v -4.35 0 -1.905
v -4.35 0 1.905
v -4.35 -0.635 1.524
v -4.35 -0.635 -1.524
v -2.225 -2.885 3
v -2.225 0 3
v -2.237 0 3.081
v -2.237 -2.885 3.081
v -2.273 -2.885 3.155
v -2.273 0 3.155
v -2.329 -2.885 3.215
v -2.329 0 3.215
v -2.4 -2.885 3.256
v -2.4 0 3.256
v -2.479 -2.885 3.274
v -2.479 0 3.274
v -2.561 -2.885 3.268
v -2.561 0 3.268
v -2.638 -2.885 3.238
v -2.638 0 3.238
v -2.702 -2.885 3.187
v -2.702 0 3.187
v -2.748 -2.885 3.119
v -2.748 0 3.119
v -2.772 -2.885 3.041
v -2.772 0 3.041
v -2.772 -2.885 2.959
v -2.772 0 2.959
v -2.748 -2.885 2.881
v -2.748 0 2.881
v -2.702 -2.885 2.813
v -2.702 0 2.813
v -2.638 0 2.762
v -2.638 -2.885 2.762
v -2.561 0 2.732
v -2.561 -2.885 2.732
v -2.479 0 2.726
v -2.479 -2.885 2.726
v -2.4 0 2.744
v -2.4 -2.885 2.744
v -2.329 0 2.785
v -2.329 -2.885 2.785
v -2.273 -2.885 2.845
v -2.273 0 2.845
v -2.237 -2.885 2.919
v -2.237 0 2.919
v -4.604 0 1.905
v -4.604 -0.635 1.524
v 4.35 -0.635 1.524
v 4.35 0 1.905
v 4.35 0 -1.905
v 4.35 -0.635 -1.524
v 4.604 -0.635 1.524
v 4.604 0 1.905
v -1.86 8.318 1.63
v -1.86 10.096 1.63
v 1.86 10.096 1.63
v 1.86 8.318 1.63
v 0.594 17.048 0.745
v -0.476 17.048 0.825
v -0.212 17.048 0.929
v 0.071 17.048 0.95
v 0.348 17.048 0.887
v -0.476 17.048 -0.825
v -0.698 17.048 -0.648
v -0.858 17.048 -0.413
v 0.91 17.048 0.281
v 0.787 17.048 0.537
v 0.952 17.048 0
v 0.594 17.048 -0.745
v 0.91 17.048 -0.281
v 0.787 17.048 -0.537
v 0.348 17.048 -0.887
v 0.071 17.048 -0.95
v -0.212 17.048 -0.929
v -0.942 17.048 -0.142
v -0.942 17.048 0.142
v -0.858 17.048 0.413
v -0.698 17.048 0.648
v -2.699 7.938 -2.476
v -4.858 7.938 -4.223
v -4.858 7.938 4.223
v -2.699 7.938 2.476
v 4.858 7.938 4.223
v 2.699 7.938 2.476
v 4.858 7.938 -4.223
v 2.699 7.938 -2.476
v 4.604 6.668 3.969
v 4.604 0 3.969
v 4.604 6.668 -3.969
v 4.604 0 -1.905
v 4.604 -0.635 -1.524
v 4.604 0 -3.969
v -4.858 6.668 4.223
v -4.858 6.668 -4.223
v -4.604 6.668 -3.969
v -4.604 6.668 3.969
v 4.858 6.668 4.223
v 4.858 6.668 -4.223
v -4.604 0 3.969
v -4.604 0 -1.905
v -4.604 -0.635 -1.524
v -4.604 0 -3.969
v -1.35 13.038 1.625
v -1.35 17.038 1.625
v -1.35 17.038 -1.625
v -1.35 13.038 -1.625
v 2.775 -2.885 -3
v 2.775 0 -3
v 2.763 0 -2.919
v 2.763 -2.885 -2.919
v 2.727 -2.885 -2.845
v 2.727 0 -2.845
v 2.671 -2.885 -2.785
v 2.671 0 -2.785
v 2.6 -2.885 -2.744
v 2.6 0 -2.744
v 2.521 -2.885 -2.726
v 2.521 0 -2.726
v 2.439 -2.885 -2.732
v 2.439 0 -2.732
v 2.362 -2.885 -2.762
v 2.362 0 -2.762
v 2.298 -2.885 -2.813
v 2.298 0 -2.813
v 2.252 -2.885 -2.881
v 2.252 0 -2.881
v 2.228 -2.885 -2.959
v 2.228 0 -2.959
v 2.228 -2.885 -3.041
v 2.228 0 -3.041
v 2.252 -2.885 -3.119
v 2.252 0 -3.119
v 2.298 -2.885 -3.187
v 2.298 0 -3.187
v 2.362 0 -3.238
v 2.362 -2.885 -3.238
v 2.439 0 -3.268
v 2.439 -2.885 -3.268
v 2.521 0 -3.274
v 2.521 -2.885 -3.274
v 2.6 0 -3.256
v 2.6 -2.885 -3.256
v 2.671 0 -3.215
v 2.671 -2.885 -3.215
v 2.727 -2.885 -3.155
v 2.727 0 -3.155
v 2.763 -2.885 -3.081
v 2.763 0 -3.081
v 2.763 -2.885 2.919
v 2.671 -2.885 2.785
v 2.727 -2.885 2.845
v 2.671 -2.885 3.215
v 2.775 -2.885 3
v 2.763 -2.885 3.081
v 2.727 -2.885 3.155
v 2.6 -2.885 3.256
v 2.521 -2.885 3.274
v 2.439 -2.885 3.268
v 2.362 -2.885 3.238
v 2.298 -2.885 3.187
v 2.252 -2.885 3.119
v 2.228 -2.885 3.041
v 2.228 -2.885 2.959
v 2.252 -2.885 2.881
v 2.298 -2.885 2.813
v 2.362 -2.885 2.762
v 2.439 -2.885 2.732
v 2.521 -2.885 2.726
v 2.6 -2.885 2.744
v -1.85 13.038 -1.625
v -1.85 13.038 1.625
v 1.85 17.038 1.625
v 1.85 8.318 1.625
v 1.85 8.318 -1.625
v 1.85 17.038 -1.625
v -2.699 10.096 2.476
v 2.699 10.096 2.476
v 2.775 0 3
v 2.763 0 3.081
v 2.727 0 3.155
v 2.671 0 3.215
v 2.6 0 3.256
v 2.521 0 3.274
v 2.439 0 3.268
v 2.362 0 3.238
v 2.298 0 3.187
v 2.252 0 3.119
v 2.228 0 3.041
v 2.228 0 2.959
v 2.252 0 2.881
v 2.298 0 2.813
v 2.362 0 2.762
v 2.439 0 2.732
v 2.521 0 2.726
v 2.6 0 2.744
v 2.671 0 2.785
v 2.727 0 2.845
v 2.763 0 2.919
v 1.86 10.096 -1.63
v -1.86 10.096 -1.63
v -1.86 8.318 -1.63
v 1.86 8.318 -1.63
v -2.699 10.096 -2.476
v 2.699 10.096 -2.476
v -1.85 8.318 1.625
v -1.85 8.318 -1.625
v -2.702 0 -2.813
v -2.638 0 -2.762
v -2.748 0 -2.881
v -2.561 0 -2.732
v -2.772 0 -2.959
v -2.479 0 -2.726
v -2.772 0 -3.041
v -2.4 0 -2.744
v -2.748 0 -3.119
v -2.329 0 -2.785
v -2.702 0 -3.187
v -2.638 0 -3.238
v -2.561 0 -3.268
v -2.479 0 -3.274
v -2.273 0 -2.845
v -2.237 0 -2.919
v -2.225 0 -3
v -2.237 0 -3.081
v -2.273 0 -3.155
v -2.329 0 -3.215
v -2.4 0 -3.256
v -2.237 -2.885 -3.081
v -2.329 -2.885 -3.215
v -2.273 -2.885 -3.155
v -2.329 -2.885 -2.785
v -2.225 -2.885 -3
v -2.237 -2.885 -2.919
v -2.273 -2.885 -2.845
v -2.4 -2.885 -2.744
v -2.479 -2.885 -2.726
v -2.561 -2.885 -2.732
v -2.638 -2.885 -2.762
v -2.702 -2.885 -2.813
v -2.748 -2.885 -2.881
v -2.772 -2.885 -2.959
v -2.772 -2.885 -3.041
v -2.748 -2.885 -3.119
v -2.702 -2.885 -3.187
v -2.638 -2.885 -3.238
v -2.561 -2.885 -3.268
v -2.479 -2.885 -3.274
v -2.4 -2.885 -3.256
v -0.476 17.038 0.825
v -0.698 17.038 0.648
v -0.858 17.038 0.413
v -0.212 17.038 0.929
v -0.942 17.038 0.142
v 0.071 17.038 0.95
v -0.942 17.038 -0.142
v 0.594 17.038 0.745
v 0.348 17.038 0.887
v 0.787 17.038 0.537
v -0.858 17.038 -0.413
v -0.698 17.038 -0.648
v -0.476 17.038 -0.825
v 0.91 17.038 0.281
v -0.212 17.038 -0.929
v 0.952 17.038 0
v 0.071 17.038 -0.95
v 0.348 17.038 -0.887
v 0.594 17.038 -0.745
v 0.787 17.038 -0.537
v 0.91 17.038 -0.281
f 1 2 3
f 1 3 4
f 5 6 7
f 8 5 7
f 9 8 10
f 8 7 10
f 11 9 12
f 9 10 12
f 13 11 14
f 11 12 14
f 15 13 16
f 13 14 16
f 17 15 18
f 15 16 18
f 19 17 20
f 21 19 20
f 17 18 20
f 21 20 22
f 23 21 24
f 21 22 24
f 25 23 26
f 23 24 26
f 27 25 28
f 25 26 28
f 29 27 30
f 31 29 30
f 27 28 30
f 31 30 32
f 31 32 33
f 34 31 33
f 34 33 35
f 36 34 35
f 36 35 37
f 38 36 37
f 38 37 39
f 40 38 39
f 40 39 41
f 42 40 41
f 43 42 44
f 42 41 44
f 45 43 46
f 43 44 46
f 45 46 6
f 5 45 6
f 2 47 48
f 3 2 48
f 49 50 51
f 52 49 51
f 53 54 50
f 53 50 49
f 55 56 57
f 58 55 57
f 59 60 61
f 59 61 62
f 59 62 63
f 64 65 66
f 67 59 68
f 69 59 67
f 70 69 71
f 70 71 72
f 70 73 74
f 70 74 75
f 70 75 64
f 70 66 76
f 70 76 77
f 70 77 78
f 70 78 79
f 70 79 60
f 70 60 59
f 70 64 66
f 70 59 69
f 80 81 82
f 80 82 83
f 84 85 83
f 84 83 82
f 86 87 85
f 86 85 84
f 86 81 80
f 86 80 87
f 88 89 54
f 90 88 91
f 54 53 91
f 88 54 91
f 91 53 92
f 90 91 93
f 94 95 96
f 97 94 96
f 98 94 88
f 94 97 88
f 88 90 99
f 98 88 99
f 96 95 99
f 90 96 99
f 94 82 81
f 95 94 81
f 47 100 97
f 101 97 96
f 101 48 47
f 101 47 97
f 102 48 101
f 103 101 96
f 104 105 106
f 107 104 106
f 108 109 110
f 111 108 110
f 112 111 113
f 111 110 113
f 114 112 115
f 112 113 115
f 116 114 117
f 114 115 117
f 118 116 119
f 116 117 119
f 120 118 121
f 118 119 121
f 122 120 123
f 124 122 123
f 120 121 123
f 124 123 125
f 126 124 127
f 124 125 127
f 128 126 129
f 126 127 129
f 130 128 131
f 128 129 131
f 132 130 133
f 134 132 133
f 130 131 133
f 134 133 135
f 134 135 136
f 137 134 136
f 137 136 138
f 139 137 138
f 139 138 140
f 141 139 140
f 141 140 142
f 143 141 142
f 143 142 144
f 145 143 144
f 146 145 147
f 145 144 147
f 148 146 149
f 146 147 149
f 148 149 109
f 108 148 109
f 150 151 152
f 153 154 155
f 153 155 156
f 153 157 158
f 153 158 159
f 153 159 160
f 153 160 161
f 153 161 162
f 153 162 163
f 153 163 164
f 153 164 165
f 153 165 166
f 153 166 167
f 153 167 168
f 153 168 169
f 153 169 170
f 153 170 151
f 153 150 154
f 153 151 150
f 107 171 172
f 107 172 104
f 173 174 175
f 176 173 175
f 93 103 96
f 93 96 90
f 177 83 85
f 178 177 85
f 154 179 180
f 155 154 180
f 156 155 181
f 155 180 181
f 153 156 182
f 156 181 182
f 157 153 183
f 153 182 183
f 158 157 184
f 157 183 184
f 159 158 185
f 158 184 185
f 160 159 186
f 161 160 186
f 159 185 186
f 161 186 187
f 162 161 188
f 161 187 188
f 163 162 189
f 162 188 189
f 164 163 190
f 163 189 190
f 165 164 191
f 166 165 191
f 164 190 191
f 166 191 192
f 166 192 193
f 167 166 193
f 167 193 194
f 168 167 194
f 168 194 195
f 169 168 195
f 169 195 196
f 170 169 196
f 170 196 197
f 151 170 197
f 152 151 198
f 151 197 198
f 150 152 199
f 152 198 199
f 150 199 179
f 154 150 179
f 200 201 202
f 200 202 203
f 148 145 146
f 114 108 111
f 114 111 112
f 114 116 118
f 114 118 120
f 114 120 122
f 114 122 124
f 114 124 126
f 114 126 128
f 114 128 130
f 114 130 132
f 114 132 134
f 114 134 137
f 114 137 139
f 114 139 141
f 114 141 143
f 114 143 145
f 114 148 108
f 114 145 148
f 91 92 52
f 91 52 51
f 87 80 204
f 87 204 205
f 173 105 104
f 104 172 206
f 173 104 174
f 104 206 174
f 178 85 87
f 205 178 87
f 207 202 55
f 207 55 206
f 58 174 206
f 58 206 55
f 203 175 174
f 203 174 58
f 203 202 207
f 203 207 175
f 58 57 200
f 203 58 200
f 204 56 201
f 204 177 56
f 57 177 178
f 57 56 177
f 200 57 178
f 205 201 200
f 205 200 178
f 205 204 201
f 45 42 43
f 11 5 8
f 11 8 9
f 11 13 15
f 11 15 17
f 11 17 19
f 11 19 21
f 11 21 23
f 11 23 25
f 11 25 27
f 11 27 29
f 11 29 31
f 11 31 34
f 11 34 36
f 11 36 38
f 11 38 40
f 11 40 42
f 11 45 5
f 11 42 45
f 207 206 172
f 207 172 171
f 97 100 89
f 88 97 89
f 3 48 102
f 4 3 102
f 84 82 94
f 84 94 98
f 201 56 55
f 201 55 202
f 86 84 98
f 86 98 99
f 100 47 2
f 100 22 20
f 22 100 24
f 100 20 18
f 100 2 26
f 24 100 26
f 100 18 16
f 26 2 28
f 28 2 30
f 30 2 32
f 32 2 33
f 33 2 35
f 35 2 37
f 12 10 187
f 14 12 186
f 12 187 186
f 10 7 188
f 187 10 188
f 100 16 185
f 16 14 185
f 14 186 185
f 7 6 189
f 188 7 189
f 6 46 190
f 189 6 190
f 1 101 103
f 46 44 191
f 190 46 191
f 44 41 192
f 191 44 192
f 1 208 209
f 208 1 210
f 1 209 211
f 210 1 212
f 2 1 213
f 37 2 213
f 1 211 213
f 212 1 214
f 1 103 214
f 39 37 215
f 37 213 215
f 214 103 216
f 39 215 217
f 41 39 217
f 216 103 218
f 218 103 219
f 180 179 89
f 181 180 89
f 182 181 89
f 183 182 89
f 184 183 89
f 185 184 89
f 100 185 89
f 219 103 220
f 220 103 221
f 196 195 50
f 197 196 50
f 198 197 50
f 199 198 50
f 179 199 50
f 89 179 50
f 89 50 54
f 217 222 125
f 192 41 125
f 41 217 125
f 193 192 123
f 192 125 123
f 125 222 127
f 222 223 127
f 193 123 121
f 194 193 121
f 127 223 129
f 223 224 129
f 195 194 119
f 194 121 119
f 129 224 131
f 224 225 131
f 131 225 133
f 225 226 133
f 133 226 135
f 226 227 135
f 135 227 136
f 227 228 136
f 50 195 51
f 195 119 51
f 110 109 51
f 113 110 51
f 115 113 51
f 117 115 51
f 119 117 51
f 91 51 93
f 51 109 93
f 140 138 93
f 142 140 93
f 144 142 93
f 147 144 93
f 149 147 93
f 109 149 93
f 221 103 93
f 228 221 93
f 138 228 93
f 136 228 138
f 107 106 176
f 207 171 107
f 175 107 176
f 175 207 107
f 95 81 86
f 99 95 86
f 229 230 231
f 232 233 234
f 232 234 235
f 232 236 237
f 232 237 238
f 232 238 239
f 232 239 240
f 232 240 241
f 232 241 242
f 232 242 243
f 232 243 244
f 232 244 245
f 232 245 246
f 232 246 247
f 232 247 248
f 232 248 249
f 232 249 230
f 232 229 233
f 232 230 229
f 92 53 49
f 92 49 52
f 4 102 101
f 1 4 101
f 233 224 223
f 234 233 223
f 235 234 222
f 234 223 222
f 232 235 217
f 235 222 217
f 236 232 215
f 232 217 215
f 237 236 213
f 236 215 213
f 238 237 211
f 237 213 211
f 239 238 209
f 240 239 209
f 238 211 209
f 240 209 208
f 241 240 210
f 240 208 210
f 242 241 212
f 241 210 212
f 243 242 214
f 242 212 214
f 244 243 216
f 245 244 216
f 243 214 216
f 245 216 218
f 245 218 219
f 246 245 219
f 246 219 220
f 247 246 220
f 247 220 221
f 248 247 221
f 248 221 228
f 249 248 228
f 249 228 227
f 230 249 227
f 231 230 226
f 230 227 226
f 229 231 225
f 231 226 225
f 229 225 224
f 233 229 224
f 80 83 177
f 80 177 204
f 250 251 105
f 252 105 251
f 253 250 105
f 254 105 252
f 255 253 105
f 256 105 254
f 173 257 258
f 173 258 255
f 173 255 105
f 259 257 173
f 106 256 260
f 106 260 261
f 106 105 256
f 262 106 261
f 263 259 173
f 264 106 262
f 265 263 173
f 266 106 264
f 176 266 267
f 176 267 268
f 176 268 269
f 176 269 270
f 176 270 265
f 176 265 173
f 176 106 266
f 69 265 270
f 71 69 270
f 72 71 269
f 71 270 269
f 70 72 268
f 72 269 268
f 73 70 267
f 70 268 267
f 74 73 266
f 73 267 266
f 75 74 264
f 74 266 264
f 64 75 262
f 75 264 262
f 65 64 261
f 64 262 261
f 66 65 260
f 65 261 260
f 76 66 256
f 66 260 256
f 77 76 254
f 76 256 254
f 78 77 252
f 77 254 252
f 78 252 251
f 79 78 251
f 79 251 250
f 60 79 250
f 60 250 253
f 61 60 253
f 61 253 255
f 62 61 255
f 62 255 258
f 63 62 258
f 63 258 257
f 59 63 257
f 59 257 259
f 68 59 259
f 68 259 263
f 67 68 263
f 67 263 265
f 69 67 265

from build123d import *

# Parameters (mm, degrees)
SKETCH1_W           = 9.2075
SKETCH1_H           = 7.9375
BOSS_EXTRUDE1_DEPTH = 7.9375
SKETCH2_W           = 5.3975
SKETCH2_H           = 4.953
BOSS_EXTRUDE2_DEPTH = 2.159
SKETCH3_W           = 3.72
SKETCH3_H           = 3.26
CUT_EXTRUDE1_DEPTH  = 1.778
SKETCH4_W           = 9.7155
SKETCH4_H           = 8.4455
SKETCH4_W_2         = 5.3975
SKETCH4_H_2         = 4.953
BOSS_EXTRUDE3_DEPTH = 1.27
BOSS_EXTRUDE4_DEPTH = 0.254
SKETCH7_W           = 3.7
SKETCH7_H           = 3.25
BOSS_EXTRUDE6_DEPTH = 8.72
SKETCH8_W           = 0.5
SKETCH8_H           = 3.25
CUT_EXTRUDE2_DEPTH  = 4
SKETCH6_R           = 0.9525
BOSS_EXTRUDE5_DEPTH = 8.73
SKETCH9_R           = 0.275
BOSS_EXTRUDE7_DEPTH = 2.885


with BuildPart() as part:
    # Sketch1 → Boss-Extrude1 (new body)
    with BuildSketch(Plane(origin=(0, 0, 0), x_dir=(1, 0, 0), z_dir=(0, 1, 0))):
        Rectangle(SKETCH1_W, SKETCH1_H)
    extrude(amount=BOSS_EXTRUDE1_DEPTH)

    # Sketch2 → Boss-Extrude2 (add)
    with BuildSketch(Plane(origin=(0, 7.9375, 0), x_dir=(1, 0, 0), z_dir=(0, 1, 0))):
        Rectangle(SKETCH2_W, SKETCH2_H)
    extrude(amount=BOSS_EXTRUDE2_DEPTH)

    # Sketch3 → Cut-Extrude1 (cut)
    with BuildSketch(Plane(origin=(0, 10.0965, 0), x_dir=(1, 0, 0), z_dir=(0, 1, 0))):
        Rectangle(SKETCH3_W, SKETCH3_H)
    extrude(amount=-CUT_EXTRUDE1_DEPTH, mode=Mode.SUBTRACT)

    # Sketch4 → Boss-Extrude3 (add)
    with BuildSketch(Plane(origin=(0, 7.9375, 0), x_dir=(1, 0, 0), z_dir=(0, 1, 0))):
        Rectangle(SKETCH4_W, SKETCH4_H)
        Rectangle(SKETCH4_W_2, SKETCH4_H_2, mode=Mode.SUBTRACT)
    extrude(amount=-BOSS_EXTRUDE3_DEPTH)

    # Sketch5 → Boss-Extrude4 (add)
    with BuildSketch(Plane(origin=(4.60375, 0, 0), x_dir=(0, 0, -1), z_dir=(1, 0, 0))):
        Polygon((1.524, -0.635), (1.905, 0), (-1.905, 0), (-1.524, -0.635), align=None)
    boss_extrude4 = extrude(amount=-BOSS_EXTRUDE4_DEPTH)

    # Mirror1: Boss-Extrude4 across plane
    add(boss_extrude4.mirror(Plane(origin=(0, 0, 0), x_dir=(0, 0, 1), z_dir=(1, 0, 0))))

    # Sketch7 → Boss-Extrude6 (add)
    with BuildSketch(Plane(origin=(0, 8.3185, 0), x_dir=(1, 0, 0), z_dir=(0, 1, 0))):
        Rectangle(SKETCH7_W, SKETCH7_H)
    extrude(amount=BOSS_EXTRUDE6_DEPTH)

    # Sketch8 → Cut-Extrude2 (cut)
    with BuildSketch(Plane(origin=(0, 17.0385, 0), x_dir=(1, 0, 0), z_dir=(0, 1, 0))):
        with Locations((-1.6, 0)):
            Rectangle(SKETCH8_W, SKETCH8_H)
    extrude(amount=-CUT_EXTRUDE2_DEPTH, mode=Mode.SUBTRACT)

    # Sketch6 → Boss-Extrude5 (add)
    with BuildSketch(Plane(origin=(0, 8.3185, 0), x_dir=(1, 0, 0), z_dir=(0, 1, 0))):
        Circle(SKETCH6_R)
    extrude(amount=BOSS_EXTRUDE5_DEPTH)

    # Sketch9 → Boss-Extrude7 (add)
    with BuildSketch(Plane.XZ):
        with Locations((-2.5, 3)):
            Circle(SKETCH9_R)
        with Locations((2.5, 3)):
            Circle(SKETCH9_R)
        with Locations((2.5, -3)):
            Circle(SKETCH9_R)
        with Locations((-2.5, -3)):
            Circle(SKETCH9_R)
    extrude(amount=BOSS_EXTRUDE7_DEPTH)


solid = part.part
